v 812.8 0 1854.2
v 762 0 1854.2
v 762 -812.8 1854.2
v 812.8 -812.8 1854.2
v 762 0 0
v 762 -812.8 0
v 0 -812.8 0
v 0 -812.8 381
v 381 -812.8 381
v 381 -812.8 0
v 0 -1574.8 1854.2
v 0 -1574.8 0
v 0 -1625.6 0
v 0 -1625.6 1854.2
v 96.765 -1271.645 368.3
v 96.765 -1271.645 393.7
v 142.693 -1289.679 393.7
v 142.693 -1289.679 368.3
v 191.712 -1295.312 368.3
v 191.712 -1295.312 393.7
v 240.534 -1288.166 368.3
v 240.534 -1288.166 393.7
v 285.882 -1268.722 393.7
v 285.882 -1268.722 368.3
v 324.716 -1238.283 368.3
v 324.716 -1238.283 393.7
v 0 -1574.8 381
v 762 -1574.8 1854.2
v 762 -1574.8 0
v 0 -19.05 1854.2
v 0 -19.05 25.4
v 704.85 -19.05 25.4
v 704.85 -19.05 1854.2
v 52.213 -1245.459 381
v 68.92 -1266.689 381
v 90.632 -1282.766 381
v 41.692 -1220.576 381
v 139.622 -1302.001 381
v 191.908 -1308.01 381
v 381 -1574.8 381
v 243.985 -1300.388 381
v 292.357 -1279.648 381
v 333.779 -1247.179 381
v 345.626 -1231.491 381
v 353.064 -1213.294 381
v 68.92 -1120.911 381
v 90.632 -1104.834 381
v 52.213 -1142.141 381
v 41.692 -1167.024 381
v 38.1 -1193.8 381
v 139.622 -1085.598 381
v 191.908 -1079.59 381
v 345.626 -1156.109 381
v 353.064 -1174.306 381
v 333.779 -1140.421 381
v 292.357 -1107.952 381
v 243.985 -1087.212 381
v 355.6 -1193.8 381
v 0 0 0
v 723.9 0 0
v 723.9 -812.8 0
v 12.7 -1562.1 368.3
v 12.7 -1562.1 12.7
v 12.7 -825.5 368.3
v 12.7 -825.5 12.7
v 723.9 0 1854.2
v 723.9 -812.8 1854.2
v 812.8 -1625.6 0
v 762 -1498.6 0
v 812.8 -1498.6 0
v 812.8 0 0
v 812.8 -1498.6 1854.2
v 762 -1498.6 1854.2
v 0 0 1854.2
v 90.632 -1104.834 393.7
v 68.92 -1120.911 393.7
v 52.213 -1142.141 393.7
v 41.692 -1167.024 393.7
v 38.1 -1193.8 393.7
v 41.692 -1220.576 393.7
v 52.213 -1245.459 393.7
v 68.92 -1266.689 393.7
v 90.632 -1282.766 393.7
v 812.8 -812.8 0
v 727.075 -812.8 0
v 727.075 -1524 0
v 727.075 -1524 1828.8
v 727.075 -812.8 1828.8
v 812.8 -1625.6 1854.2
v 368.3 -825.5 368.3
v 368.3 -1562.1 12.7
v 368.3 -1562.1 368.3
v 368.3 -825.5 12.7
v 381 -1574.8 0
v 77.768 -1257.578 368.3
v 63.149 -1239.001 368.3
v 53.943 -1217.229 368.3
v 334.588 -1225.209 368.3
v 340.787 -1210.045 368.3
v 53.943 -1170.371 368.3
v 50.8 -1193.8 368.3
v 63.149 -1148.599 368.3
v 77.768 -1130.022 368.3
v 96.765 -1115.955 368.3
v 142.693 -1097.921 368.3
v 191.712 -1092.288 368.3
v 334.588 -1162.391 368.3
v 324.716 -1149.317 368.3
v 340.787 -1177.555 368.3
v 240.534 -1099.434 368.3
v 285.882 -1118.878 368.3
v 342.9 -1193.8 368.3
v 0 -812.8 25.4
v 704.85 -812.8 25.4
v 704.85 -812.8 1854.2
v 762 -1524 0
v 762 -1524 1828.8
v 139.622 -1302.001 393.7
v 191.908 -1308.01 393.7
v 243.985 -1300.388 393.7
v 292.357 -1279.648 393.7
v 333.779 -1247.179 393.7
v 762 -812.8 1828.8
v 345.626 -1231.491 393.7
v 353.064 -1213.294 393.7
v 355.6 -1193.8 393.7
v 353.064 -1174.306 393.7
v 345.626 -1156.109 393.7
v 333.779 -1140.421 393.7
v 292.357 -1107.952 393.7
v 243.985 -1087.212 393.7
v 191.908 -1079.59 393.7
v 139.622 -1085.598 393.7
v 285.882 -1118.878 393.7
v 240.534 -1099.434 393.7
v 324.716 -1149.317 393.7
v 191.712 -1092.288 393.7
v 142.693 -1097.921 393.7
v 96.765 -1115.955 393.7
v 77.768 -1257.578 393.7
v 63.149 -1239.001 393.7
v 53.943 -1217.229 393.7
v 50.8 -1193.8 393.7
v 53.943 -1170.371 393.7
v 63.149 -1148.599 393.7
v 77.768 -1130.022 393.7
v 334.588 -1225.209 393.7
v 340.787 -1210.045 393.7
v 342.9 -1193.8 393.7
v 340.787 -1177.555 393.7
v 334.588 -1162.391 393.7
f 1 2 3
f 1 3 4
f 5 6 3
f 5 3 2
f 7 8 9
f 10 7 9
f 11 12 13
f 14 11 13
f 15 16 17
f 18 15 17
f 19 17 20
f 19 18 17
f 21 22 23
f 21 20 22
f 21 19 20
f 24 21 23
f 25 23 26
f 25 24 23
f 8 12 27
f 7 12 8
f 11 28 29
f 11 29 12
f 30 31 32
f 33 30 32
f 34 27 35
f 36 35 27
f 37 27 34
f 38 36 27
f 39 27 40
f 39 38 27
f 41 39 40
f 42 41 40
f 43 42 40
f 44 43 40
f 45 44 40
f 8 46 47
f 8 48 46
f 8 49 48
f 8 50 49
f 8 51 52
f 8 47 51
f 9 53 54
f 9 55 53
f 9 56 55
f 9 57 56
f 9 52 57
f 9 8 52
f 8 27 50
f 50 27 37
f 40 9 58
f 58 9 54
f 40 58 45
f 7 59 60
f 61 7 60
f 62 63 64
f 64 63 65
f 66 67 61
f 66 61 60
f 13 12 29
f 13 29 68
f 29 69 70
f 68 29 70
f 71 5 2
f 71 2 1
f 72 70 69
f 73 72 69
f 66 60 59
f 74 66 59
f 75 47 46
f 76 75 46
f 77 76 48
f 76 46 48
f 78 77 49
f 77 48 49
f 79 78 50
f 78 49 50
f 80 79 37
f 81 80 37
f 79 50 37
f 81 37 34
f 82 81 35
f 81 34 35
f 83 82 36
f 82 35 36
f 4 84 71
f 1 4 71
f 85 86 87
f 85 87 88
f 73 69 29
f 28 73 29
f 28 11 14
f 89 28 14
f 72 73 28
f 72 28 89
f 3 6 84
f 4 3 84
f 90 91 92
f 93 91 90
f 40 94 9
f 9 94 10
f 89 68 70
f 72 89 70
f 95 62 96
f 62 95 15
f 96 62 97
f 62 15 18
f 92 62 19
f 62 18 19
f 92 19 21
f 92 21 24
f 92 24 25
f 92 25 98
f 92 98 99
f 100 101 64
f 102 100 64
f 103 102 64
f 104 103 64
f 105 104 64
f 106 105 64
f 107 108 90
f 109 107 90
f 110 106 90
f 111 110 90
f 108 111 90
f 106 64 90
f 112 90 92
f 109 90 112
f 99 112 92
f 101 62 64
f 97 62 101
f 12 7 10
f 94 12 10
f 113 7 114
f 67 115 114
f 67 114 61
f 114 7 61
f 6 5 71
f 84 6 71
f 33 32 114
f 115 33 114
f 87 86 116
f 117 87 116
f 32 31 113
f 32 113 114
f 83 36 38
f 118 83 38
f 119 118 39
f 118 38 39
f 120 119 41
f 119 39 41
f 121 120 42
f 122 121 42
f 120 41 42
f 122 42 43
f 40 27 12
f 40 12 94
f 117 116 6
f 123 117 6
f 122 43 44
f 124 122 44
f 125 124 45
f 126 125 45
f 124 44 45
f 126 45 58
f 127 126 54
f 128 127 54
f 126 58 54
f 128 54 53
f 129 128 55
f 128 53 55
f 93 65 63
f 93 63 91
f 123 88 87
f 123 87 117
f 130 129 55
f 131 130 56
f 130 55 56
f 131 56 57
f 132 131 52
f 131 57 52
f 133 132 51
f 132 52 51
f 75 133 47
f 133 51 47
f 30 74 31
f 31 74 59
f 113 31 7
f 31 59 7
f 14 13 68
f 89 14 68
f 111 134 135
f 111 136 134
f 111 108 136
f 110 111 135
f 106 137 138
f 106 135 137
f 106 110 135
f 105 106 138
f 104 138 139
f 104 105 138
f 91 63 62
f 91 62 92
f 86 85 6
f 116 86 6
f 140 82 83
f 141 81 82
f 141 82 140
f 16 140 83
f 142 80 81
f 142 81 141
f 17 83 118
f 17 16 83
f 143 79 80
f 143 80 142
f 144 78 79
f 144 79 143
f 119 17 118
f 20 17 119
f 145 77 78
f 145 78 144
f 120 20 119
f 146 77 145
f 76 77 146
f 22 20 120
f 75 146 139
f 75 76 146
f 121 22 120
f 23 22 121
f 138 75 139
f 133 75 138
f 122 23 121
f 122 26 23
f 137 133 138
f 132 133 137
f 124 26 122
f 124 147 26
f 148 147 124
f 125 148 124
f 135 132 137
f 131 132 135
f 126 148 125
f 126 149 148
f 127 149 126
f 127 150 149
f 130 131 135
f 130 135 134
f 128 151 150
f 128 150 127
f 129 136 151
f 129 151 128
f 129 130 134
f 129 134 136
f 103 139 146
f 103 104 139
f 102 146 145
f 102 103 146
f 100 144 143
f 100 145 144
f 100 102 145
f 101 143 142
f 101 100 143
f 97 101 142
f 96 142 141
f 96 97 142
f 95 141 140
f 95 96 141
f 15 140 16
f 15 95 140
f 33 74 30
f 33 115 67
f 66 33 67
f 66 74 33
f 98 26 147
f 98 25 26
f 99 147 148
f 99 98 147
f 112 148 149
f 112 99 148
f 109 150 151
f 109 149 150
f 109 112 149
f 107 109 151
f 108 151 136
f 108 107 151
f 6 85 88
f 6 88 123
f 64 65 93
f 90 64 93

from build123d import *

# Parameters (mm, degrees)
F1_W      = 50.8
F1_H      = 812.8
F2_DEPTH  = 1854.2
F3_W      = 723.9
F3_H      = 812.8
F4_DEPTH  = 25.4
F5_W      = 381
F5_H      = 762
F6_DEPTH  = 381
F8_DEPTH  = 1854.2
F10_DEPTH = 1828.8
F11_W     = 34.925
F11_H     = 711.2
F12_DEPTH = 1828.8
F14_DEPTH = 12.7
F15_T     = -12.7


with BuildPart() as f2:
    # F1 (on Top) → F2 (new body)
    with BuildSketch(Plane.XY):
        with Locations((787.4, -406.4)):
            Rectangle(F1_W, F1_H)
    extrude(amount=F2_DEPTH)


with BuildPart() as f4:
    # F3 (on Top) → F4 (new body)
    with BuildSketch(Plane.XY):
        with Locations((361.95, -406.4)):
            Rectangle(F3_W, F3_H)
    extrude(amount=F4_DEPTH)

    # F9 (on face) → F10 (join, through all)
    with BuildSketch(Plane.XY.offset(25.4)):
        Polygon((0, 0), (0, -19.05), (704.85, -19.05), (704.85, -812.8), (723.9, -812.8), (723.9, 0), align=None)
    extrude(amount=F10_DEPTH)


with BuildPart() as f6:
    # F5 (on Top) → F6 (new body)
    with BuildSketch(Plane.XY):
        with Locations((190.5, -1193.8)):
            Rectangle(F5_W, F5_H)
    extrude(amount=F6_DEPTH)

    # F13 (on face) → F14 (join)
    with BuildSketch(Plane.XY.offset(381)):
        with BuildLine():
            ThreePointArc((333.7790857735, -1247.179350225), (355.6, -1193.8), (333.7790857735, -1140.420649775))
            ThreePointArc((333.7790857735, -1140.420649775), (218.1943715609, -1081.7075223967), (90.6318214739, -1104.8344180263))
            ThreePointArc((90.6318214739, -1104.8344180263), (38.1, -1193.7999948306), (90.6318214739, -1282.7655716349))
            ThreePointArc((90.6318214739, -1282.7655716349), (218.1943694086, -1305.8924696167), (333.7790857735, -1247.179350225))
        make_face()
    extrude(amount=F14_DEPTH)

    # F15
    f15_openings = [f6.faces().sort_by_distance(p)[0] for p in [
        (193.526876, -1193.799996, 393.7),
    ]]
    offset(amount=F15_T, openings=f15_openings, kind=Kind.INTERSECTION)


with BuildPart() as f8:
    # F7 (on Top) → F8 (new body, through all)
    with BuildSketch(Plane.XY):
        Polygon((762, -1574.8), (0, -1574.8), (0, -1625.6), (812.8, -1625.6), (812.8, -1498.6), (762, -1498.6), align=None)
    extrude(amount=F8_DEPTH)


with BuildPart() as f12:
    # F11 (on Top) → F12 (new body)
    with BuildSketch(Plane.XY):
        with Locations((744.5375, -1168.4)):
            Rectangle(F11_W, F11_H)
    extrude(amount=F12_DEPTH)


solid = Compound([f2.part, f4.part, f6.part, f8.part, f12.part])
